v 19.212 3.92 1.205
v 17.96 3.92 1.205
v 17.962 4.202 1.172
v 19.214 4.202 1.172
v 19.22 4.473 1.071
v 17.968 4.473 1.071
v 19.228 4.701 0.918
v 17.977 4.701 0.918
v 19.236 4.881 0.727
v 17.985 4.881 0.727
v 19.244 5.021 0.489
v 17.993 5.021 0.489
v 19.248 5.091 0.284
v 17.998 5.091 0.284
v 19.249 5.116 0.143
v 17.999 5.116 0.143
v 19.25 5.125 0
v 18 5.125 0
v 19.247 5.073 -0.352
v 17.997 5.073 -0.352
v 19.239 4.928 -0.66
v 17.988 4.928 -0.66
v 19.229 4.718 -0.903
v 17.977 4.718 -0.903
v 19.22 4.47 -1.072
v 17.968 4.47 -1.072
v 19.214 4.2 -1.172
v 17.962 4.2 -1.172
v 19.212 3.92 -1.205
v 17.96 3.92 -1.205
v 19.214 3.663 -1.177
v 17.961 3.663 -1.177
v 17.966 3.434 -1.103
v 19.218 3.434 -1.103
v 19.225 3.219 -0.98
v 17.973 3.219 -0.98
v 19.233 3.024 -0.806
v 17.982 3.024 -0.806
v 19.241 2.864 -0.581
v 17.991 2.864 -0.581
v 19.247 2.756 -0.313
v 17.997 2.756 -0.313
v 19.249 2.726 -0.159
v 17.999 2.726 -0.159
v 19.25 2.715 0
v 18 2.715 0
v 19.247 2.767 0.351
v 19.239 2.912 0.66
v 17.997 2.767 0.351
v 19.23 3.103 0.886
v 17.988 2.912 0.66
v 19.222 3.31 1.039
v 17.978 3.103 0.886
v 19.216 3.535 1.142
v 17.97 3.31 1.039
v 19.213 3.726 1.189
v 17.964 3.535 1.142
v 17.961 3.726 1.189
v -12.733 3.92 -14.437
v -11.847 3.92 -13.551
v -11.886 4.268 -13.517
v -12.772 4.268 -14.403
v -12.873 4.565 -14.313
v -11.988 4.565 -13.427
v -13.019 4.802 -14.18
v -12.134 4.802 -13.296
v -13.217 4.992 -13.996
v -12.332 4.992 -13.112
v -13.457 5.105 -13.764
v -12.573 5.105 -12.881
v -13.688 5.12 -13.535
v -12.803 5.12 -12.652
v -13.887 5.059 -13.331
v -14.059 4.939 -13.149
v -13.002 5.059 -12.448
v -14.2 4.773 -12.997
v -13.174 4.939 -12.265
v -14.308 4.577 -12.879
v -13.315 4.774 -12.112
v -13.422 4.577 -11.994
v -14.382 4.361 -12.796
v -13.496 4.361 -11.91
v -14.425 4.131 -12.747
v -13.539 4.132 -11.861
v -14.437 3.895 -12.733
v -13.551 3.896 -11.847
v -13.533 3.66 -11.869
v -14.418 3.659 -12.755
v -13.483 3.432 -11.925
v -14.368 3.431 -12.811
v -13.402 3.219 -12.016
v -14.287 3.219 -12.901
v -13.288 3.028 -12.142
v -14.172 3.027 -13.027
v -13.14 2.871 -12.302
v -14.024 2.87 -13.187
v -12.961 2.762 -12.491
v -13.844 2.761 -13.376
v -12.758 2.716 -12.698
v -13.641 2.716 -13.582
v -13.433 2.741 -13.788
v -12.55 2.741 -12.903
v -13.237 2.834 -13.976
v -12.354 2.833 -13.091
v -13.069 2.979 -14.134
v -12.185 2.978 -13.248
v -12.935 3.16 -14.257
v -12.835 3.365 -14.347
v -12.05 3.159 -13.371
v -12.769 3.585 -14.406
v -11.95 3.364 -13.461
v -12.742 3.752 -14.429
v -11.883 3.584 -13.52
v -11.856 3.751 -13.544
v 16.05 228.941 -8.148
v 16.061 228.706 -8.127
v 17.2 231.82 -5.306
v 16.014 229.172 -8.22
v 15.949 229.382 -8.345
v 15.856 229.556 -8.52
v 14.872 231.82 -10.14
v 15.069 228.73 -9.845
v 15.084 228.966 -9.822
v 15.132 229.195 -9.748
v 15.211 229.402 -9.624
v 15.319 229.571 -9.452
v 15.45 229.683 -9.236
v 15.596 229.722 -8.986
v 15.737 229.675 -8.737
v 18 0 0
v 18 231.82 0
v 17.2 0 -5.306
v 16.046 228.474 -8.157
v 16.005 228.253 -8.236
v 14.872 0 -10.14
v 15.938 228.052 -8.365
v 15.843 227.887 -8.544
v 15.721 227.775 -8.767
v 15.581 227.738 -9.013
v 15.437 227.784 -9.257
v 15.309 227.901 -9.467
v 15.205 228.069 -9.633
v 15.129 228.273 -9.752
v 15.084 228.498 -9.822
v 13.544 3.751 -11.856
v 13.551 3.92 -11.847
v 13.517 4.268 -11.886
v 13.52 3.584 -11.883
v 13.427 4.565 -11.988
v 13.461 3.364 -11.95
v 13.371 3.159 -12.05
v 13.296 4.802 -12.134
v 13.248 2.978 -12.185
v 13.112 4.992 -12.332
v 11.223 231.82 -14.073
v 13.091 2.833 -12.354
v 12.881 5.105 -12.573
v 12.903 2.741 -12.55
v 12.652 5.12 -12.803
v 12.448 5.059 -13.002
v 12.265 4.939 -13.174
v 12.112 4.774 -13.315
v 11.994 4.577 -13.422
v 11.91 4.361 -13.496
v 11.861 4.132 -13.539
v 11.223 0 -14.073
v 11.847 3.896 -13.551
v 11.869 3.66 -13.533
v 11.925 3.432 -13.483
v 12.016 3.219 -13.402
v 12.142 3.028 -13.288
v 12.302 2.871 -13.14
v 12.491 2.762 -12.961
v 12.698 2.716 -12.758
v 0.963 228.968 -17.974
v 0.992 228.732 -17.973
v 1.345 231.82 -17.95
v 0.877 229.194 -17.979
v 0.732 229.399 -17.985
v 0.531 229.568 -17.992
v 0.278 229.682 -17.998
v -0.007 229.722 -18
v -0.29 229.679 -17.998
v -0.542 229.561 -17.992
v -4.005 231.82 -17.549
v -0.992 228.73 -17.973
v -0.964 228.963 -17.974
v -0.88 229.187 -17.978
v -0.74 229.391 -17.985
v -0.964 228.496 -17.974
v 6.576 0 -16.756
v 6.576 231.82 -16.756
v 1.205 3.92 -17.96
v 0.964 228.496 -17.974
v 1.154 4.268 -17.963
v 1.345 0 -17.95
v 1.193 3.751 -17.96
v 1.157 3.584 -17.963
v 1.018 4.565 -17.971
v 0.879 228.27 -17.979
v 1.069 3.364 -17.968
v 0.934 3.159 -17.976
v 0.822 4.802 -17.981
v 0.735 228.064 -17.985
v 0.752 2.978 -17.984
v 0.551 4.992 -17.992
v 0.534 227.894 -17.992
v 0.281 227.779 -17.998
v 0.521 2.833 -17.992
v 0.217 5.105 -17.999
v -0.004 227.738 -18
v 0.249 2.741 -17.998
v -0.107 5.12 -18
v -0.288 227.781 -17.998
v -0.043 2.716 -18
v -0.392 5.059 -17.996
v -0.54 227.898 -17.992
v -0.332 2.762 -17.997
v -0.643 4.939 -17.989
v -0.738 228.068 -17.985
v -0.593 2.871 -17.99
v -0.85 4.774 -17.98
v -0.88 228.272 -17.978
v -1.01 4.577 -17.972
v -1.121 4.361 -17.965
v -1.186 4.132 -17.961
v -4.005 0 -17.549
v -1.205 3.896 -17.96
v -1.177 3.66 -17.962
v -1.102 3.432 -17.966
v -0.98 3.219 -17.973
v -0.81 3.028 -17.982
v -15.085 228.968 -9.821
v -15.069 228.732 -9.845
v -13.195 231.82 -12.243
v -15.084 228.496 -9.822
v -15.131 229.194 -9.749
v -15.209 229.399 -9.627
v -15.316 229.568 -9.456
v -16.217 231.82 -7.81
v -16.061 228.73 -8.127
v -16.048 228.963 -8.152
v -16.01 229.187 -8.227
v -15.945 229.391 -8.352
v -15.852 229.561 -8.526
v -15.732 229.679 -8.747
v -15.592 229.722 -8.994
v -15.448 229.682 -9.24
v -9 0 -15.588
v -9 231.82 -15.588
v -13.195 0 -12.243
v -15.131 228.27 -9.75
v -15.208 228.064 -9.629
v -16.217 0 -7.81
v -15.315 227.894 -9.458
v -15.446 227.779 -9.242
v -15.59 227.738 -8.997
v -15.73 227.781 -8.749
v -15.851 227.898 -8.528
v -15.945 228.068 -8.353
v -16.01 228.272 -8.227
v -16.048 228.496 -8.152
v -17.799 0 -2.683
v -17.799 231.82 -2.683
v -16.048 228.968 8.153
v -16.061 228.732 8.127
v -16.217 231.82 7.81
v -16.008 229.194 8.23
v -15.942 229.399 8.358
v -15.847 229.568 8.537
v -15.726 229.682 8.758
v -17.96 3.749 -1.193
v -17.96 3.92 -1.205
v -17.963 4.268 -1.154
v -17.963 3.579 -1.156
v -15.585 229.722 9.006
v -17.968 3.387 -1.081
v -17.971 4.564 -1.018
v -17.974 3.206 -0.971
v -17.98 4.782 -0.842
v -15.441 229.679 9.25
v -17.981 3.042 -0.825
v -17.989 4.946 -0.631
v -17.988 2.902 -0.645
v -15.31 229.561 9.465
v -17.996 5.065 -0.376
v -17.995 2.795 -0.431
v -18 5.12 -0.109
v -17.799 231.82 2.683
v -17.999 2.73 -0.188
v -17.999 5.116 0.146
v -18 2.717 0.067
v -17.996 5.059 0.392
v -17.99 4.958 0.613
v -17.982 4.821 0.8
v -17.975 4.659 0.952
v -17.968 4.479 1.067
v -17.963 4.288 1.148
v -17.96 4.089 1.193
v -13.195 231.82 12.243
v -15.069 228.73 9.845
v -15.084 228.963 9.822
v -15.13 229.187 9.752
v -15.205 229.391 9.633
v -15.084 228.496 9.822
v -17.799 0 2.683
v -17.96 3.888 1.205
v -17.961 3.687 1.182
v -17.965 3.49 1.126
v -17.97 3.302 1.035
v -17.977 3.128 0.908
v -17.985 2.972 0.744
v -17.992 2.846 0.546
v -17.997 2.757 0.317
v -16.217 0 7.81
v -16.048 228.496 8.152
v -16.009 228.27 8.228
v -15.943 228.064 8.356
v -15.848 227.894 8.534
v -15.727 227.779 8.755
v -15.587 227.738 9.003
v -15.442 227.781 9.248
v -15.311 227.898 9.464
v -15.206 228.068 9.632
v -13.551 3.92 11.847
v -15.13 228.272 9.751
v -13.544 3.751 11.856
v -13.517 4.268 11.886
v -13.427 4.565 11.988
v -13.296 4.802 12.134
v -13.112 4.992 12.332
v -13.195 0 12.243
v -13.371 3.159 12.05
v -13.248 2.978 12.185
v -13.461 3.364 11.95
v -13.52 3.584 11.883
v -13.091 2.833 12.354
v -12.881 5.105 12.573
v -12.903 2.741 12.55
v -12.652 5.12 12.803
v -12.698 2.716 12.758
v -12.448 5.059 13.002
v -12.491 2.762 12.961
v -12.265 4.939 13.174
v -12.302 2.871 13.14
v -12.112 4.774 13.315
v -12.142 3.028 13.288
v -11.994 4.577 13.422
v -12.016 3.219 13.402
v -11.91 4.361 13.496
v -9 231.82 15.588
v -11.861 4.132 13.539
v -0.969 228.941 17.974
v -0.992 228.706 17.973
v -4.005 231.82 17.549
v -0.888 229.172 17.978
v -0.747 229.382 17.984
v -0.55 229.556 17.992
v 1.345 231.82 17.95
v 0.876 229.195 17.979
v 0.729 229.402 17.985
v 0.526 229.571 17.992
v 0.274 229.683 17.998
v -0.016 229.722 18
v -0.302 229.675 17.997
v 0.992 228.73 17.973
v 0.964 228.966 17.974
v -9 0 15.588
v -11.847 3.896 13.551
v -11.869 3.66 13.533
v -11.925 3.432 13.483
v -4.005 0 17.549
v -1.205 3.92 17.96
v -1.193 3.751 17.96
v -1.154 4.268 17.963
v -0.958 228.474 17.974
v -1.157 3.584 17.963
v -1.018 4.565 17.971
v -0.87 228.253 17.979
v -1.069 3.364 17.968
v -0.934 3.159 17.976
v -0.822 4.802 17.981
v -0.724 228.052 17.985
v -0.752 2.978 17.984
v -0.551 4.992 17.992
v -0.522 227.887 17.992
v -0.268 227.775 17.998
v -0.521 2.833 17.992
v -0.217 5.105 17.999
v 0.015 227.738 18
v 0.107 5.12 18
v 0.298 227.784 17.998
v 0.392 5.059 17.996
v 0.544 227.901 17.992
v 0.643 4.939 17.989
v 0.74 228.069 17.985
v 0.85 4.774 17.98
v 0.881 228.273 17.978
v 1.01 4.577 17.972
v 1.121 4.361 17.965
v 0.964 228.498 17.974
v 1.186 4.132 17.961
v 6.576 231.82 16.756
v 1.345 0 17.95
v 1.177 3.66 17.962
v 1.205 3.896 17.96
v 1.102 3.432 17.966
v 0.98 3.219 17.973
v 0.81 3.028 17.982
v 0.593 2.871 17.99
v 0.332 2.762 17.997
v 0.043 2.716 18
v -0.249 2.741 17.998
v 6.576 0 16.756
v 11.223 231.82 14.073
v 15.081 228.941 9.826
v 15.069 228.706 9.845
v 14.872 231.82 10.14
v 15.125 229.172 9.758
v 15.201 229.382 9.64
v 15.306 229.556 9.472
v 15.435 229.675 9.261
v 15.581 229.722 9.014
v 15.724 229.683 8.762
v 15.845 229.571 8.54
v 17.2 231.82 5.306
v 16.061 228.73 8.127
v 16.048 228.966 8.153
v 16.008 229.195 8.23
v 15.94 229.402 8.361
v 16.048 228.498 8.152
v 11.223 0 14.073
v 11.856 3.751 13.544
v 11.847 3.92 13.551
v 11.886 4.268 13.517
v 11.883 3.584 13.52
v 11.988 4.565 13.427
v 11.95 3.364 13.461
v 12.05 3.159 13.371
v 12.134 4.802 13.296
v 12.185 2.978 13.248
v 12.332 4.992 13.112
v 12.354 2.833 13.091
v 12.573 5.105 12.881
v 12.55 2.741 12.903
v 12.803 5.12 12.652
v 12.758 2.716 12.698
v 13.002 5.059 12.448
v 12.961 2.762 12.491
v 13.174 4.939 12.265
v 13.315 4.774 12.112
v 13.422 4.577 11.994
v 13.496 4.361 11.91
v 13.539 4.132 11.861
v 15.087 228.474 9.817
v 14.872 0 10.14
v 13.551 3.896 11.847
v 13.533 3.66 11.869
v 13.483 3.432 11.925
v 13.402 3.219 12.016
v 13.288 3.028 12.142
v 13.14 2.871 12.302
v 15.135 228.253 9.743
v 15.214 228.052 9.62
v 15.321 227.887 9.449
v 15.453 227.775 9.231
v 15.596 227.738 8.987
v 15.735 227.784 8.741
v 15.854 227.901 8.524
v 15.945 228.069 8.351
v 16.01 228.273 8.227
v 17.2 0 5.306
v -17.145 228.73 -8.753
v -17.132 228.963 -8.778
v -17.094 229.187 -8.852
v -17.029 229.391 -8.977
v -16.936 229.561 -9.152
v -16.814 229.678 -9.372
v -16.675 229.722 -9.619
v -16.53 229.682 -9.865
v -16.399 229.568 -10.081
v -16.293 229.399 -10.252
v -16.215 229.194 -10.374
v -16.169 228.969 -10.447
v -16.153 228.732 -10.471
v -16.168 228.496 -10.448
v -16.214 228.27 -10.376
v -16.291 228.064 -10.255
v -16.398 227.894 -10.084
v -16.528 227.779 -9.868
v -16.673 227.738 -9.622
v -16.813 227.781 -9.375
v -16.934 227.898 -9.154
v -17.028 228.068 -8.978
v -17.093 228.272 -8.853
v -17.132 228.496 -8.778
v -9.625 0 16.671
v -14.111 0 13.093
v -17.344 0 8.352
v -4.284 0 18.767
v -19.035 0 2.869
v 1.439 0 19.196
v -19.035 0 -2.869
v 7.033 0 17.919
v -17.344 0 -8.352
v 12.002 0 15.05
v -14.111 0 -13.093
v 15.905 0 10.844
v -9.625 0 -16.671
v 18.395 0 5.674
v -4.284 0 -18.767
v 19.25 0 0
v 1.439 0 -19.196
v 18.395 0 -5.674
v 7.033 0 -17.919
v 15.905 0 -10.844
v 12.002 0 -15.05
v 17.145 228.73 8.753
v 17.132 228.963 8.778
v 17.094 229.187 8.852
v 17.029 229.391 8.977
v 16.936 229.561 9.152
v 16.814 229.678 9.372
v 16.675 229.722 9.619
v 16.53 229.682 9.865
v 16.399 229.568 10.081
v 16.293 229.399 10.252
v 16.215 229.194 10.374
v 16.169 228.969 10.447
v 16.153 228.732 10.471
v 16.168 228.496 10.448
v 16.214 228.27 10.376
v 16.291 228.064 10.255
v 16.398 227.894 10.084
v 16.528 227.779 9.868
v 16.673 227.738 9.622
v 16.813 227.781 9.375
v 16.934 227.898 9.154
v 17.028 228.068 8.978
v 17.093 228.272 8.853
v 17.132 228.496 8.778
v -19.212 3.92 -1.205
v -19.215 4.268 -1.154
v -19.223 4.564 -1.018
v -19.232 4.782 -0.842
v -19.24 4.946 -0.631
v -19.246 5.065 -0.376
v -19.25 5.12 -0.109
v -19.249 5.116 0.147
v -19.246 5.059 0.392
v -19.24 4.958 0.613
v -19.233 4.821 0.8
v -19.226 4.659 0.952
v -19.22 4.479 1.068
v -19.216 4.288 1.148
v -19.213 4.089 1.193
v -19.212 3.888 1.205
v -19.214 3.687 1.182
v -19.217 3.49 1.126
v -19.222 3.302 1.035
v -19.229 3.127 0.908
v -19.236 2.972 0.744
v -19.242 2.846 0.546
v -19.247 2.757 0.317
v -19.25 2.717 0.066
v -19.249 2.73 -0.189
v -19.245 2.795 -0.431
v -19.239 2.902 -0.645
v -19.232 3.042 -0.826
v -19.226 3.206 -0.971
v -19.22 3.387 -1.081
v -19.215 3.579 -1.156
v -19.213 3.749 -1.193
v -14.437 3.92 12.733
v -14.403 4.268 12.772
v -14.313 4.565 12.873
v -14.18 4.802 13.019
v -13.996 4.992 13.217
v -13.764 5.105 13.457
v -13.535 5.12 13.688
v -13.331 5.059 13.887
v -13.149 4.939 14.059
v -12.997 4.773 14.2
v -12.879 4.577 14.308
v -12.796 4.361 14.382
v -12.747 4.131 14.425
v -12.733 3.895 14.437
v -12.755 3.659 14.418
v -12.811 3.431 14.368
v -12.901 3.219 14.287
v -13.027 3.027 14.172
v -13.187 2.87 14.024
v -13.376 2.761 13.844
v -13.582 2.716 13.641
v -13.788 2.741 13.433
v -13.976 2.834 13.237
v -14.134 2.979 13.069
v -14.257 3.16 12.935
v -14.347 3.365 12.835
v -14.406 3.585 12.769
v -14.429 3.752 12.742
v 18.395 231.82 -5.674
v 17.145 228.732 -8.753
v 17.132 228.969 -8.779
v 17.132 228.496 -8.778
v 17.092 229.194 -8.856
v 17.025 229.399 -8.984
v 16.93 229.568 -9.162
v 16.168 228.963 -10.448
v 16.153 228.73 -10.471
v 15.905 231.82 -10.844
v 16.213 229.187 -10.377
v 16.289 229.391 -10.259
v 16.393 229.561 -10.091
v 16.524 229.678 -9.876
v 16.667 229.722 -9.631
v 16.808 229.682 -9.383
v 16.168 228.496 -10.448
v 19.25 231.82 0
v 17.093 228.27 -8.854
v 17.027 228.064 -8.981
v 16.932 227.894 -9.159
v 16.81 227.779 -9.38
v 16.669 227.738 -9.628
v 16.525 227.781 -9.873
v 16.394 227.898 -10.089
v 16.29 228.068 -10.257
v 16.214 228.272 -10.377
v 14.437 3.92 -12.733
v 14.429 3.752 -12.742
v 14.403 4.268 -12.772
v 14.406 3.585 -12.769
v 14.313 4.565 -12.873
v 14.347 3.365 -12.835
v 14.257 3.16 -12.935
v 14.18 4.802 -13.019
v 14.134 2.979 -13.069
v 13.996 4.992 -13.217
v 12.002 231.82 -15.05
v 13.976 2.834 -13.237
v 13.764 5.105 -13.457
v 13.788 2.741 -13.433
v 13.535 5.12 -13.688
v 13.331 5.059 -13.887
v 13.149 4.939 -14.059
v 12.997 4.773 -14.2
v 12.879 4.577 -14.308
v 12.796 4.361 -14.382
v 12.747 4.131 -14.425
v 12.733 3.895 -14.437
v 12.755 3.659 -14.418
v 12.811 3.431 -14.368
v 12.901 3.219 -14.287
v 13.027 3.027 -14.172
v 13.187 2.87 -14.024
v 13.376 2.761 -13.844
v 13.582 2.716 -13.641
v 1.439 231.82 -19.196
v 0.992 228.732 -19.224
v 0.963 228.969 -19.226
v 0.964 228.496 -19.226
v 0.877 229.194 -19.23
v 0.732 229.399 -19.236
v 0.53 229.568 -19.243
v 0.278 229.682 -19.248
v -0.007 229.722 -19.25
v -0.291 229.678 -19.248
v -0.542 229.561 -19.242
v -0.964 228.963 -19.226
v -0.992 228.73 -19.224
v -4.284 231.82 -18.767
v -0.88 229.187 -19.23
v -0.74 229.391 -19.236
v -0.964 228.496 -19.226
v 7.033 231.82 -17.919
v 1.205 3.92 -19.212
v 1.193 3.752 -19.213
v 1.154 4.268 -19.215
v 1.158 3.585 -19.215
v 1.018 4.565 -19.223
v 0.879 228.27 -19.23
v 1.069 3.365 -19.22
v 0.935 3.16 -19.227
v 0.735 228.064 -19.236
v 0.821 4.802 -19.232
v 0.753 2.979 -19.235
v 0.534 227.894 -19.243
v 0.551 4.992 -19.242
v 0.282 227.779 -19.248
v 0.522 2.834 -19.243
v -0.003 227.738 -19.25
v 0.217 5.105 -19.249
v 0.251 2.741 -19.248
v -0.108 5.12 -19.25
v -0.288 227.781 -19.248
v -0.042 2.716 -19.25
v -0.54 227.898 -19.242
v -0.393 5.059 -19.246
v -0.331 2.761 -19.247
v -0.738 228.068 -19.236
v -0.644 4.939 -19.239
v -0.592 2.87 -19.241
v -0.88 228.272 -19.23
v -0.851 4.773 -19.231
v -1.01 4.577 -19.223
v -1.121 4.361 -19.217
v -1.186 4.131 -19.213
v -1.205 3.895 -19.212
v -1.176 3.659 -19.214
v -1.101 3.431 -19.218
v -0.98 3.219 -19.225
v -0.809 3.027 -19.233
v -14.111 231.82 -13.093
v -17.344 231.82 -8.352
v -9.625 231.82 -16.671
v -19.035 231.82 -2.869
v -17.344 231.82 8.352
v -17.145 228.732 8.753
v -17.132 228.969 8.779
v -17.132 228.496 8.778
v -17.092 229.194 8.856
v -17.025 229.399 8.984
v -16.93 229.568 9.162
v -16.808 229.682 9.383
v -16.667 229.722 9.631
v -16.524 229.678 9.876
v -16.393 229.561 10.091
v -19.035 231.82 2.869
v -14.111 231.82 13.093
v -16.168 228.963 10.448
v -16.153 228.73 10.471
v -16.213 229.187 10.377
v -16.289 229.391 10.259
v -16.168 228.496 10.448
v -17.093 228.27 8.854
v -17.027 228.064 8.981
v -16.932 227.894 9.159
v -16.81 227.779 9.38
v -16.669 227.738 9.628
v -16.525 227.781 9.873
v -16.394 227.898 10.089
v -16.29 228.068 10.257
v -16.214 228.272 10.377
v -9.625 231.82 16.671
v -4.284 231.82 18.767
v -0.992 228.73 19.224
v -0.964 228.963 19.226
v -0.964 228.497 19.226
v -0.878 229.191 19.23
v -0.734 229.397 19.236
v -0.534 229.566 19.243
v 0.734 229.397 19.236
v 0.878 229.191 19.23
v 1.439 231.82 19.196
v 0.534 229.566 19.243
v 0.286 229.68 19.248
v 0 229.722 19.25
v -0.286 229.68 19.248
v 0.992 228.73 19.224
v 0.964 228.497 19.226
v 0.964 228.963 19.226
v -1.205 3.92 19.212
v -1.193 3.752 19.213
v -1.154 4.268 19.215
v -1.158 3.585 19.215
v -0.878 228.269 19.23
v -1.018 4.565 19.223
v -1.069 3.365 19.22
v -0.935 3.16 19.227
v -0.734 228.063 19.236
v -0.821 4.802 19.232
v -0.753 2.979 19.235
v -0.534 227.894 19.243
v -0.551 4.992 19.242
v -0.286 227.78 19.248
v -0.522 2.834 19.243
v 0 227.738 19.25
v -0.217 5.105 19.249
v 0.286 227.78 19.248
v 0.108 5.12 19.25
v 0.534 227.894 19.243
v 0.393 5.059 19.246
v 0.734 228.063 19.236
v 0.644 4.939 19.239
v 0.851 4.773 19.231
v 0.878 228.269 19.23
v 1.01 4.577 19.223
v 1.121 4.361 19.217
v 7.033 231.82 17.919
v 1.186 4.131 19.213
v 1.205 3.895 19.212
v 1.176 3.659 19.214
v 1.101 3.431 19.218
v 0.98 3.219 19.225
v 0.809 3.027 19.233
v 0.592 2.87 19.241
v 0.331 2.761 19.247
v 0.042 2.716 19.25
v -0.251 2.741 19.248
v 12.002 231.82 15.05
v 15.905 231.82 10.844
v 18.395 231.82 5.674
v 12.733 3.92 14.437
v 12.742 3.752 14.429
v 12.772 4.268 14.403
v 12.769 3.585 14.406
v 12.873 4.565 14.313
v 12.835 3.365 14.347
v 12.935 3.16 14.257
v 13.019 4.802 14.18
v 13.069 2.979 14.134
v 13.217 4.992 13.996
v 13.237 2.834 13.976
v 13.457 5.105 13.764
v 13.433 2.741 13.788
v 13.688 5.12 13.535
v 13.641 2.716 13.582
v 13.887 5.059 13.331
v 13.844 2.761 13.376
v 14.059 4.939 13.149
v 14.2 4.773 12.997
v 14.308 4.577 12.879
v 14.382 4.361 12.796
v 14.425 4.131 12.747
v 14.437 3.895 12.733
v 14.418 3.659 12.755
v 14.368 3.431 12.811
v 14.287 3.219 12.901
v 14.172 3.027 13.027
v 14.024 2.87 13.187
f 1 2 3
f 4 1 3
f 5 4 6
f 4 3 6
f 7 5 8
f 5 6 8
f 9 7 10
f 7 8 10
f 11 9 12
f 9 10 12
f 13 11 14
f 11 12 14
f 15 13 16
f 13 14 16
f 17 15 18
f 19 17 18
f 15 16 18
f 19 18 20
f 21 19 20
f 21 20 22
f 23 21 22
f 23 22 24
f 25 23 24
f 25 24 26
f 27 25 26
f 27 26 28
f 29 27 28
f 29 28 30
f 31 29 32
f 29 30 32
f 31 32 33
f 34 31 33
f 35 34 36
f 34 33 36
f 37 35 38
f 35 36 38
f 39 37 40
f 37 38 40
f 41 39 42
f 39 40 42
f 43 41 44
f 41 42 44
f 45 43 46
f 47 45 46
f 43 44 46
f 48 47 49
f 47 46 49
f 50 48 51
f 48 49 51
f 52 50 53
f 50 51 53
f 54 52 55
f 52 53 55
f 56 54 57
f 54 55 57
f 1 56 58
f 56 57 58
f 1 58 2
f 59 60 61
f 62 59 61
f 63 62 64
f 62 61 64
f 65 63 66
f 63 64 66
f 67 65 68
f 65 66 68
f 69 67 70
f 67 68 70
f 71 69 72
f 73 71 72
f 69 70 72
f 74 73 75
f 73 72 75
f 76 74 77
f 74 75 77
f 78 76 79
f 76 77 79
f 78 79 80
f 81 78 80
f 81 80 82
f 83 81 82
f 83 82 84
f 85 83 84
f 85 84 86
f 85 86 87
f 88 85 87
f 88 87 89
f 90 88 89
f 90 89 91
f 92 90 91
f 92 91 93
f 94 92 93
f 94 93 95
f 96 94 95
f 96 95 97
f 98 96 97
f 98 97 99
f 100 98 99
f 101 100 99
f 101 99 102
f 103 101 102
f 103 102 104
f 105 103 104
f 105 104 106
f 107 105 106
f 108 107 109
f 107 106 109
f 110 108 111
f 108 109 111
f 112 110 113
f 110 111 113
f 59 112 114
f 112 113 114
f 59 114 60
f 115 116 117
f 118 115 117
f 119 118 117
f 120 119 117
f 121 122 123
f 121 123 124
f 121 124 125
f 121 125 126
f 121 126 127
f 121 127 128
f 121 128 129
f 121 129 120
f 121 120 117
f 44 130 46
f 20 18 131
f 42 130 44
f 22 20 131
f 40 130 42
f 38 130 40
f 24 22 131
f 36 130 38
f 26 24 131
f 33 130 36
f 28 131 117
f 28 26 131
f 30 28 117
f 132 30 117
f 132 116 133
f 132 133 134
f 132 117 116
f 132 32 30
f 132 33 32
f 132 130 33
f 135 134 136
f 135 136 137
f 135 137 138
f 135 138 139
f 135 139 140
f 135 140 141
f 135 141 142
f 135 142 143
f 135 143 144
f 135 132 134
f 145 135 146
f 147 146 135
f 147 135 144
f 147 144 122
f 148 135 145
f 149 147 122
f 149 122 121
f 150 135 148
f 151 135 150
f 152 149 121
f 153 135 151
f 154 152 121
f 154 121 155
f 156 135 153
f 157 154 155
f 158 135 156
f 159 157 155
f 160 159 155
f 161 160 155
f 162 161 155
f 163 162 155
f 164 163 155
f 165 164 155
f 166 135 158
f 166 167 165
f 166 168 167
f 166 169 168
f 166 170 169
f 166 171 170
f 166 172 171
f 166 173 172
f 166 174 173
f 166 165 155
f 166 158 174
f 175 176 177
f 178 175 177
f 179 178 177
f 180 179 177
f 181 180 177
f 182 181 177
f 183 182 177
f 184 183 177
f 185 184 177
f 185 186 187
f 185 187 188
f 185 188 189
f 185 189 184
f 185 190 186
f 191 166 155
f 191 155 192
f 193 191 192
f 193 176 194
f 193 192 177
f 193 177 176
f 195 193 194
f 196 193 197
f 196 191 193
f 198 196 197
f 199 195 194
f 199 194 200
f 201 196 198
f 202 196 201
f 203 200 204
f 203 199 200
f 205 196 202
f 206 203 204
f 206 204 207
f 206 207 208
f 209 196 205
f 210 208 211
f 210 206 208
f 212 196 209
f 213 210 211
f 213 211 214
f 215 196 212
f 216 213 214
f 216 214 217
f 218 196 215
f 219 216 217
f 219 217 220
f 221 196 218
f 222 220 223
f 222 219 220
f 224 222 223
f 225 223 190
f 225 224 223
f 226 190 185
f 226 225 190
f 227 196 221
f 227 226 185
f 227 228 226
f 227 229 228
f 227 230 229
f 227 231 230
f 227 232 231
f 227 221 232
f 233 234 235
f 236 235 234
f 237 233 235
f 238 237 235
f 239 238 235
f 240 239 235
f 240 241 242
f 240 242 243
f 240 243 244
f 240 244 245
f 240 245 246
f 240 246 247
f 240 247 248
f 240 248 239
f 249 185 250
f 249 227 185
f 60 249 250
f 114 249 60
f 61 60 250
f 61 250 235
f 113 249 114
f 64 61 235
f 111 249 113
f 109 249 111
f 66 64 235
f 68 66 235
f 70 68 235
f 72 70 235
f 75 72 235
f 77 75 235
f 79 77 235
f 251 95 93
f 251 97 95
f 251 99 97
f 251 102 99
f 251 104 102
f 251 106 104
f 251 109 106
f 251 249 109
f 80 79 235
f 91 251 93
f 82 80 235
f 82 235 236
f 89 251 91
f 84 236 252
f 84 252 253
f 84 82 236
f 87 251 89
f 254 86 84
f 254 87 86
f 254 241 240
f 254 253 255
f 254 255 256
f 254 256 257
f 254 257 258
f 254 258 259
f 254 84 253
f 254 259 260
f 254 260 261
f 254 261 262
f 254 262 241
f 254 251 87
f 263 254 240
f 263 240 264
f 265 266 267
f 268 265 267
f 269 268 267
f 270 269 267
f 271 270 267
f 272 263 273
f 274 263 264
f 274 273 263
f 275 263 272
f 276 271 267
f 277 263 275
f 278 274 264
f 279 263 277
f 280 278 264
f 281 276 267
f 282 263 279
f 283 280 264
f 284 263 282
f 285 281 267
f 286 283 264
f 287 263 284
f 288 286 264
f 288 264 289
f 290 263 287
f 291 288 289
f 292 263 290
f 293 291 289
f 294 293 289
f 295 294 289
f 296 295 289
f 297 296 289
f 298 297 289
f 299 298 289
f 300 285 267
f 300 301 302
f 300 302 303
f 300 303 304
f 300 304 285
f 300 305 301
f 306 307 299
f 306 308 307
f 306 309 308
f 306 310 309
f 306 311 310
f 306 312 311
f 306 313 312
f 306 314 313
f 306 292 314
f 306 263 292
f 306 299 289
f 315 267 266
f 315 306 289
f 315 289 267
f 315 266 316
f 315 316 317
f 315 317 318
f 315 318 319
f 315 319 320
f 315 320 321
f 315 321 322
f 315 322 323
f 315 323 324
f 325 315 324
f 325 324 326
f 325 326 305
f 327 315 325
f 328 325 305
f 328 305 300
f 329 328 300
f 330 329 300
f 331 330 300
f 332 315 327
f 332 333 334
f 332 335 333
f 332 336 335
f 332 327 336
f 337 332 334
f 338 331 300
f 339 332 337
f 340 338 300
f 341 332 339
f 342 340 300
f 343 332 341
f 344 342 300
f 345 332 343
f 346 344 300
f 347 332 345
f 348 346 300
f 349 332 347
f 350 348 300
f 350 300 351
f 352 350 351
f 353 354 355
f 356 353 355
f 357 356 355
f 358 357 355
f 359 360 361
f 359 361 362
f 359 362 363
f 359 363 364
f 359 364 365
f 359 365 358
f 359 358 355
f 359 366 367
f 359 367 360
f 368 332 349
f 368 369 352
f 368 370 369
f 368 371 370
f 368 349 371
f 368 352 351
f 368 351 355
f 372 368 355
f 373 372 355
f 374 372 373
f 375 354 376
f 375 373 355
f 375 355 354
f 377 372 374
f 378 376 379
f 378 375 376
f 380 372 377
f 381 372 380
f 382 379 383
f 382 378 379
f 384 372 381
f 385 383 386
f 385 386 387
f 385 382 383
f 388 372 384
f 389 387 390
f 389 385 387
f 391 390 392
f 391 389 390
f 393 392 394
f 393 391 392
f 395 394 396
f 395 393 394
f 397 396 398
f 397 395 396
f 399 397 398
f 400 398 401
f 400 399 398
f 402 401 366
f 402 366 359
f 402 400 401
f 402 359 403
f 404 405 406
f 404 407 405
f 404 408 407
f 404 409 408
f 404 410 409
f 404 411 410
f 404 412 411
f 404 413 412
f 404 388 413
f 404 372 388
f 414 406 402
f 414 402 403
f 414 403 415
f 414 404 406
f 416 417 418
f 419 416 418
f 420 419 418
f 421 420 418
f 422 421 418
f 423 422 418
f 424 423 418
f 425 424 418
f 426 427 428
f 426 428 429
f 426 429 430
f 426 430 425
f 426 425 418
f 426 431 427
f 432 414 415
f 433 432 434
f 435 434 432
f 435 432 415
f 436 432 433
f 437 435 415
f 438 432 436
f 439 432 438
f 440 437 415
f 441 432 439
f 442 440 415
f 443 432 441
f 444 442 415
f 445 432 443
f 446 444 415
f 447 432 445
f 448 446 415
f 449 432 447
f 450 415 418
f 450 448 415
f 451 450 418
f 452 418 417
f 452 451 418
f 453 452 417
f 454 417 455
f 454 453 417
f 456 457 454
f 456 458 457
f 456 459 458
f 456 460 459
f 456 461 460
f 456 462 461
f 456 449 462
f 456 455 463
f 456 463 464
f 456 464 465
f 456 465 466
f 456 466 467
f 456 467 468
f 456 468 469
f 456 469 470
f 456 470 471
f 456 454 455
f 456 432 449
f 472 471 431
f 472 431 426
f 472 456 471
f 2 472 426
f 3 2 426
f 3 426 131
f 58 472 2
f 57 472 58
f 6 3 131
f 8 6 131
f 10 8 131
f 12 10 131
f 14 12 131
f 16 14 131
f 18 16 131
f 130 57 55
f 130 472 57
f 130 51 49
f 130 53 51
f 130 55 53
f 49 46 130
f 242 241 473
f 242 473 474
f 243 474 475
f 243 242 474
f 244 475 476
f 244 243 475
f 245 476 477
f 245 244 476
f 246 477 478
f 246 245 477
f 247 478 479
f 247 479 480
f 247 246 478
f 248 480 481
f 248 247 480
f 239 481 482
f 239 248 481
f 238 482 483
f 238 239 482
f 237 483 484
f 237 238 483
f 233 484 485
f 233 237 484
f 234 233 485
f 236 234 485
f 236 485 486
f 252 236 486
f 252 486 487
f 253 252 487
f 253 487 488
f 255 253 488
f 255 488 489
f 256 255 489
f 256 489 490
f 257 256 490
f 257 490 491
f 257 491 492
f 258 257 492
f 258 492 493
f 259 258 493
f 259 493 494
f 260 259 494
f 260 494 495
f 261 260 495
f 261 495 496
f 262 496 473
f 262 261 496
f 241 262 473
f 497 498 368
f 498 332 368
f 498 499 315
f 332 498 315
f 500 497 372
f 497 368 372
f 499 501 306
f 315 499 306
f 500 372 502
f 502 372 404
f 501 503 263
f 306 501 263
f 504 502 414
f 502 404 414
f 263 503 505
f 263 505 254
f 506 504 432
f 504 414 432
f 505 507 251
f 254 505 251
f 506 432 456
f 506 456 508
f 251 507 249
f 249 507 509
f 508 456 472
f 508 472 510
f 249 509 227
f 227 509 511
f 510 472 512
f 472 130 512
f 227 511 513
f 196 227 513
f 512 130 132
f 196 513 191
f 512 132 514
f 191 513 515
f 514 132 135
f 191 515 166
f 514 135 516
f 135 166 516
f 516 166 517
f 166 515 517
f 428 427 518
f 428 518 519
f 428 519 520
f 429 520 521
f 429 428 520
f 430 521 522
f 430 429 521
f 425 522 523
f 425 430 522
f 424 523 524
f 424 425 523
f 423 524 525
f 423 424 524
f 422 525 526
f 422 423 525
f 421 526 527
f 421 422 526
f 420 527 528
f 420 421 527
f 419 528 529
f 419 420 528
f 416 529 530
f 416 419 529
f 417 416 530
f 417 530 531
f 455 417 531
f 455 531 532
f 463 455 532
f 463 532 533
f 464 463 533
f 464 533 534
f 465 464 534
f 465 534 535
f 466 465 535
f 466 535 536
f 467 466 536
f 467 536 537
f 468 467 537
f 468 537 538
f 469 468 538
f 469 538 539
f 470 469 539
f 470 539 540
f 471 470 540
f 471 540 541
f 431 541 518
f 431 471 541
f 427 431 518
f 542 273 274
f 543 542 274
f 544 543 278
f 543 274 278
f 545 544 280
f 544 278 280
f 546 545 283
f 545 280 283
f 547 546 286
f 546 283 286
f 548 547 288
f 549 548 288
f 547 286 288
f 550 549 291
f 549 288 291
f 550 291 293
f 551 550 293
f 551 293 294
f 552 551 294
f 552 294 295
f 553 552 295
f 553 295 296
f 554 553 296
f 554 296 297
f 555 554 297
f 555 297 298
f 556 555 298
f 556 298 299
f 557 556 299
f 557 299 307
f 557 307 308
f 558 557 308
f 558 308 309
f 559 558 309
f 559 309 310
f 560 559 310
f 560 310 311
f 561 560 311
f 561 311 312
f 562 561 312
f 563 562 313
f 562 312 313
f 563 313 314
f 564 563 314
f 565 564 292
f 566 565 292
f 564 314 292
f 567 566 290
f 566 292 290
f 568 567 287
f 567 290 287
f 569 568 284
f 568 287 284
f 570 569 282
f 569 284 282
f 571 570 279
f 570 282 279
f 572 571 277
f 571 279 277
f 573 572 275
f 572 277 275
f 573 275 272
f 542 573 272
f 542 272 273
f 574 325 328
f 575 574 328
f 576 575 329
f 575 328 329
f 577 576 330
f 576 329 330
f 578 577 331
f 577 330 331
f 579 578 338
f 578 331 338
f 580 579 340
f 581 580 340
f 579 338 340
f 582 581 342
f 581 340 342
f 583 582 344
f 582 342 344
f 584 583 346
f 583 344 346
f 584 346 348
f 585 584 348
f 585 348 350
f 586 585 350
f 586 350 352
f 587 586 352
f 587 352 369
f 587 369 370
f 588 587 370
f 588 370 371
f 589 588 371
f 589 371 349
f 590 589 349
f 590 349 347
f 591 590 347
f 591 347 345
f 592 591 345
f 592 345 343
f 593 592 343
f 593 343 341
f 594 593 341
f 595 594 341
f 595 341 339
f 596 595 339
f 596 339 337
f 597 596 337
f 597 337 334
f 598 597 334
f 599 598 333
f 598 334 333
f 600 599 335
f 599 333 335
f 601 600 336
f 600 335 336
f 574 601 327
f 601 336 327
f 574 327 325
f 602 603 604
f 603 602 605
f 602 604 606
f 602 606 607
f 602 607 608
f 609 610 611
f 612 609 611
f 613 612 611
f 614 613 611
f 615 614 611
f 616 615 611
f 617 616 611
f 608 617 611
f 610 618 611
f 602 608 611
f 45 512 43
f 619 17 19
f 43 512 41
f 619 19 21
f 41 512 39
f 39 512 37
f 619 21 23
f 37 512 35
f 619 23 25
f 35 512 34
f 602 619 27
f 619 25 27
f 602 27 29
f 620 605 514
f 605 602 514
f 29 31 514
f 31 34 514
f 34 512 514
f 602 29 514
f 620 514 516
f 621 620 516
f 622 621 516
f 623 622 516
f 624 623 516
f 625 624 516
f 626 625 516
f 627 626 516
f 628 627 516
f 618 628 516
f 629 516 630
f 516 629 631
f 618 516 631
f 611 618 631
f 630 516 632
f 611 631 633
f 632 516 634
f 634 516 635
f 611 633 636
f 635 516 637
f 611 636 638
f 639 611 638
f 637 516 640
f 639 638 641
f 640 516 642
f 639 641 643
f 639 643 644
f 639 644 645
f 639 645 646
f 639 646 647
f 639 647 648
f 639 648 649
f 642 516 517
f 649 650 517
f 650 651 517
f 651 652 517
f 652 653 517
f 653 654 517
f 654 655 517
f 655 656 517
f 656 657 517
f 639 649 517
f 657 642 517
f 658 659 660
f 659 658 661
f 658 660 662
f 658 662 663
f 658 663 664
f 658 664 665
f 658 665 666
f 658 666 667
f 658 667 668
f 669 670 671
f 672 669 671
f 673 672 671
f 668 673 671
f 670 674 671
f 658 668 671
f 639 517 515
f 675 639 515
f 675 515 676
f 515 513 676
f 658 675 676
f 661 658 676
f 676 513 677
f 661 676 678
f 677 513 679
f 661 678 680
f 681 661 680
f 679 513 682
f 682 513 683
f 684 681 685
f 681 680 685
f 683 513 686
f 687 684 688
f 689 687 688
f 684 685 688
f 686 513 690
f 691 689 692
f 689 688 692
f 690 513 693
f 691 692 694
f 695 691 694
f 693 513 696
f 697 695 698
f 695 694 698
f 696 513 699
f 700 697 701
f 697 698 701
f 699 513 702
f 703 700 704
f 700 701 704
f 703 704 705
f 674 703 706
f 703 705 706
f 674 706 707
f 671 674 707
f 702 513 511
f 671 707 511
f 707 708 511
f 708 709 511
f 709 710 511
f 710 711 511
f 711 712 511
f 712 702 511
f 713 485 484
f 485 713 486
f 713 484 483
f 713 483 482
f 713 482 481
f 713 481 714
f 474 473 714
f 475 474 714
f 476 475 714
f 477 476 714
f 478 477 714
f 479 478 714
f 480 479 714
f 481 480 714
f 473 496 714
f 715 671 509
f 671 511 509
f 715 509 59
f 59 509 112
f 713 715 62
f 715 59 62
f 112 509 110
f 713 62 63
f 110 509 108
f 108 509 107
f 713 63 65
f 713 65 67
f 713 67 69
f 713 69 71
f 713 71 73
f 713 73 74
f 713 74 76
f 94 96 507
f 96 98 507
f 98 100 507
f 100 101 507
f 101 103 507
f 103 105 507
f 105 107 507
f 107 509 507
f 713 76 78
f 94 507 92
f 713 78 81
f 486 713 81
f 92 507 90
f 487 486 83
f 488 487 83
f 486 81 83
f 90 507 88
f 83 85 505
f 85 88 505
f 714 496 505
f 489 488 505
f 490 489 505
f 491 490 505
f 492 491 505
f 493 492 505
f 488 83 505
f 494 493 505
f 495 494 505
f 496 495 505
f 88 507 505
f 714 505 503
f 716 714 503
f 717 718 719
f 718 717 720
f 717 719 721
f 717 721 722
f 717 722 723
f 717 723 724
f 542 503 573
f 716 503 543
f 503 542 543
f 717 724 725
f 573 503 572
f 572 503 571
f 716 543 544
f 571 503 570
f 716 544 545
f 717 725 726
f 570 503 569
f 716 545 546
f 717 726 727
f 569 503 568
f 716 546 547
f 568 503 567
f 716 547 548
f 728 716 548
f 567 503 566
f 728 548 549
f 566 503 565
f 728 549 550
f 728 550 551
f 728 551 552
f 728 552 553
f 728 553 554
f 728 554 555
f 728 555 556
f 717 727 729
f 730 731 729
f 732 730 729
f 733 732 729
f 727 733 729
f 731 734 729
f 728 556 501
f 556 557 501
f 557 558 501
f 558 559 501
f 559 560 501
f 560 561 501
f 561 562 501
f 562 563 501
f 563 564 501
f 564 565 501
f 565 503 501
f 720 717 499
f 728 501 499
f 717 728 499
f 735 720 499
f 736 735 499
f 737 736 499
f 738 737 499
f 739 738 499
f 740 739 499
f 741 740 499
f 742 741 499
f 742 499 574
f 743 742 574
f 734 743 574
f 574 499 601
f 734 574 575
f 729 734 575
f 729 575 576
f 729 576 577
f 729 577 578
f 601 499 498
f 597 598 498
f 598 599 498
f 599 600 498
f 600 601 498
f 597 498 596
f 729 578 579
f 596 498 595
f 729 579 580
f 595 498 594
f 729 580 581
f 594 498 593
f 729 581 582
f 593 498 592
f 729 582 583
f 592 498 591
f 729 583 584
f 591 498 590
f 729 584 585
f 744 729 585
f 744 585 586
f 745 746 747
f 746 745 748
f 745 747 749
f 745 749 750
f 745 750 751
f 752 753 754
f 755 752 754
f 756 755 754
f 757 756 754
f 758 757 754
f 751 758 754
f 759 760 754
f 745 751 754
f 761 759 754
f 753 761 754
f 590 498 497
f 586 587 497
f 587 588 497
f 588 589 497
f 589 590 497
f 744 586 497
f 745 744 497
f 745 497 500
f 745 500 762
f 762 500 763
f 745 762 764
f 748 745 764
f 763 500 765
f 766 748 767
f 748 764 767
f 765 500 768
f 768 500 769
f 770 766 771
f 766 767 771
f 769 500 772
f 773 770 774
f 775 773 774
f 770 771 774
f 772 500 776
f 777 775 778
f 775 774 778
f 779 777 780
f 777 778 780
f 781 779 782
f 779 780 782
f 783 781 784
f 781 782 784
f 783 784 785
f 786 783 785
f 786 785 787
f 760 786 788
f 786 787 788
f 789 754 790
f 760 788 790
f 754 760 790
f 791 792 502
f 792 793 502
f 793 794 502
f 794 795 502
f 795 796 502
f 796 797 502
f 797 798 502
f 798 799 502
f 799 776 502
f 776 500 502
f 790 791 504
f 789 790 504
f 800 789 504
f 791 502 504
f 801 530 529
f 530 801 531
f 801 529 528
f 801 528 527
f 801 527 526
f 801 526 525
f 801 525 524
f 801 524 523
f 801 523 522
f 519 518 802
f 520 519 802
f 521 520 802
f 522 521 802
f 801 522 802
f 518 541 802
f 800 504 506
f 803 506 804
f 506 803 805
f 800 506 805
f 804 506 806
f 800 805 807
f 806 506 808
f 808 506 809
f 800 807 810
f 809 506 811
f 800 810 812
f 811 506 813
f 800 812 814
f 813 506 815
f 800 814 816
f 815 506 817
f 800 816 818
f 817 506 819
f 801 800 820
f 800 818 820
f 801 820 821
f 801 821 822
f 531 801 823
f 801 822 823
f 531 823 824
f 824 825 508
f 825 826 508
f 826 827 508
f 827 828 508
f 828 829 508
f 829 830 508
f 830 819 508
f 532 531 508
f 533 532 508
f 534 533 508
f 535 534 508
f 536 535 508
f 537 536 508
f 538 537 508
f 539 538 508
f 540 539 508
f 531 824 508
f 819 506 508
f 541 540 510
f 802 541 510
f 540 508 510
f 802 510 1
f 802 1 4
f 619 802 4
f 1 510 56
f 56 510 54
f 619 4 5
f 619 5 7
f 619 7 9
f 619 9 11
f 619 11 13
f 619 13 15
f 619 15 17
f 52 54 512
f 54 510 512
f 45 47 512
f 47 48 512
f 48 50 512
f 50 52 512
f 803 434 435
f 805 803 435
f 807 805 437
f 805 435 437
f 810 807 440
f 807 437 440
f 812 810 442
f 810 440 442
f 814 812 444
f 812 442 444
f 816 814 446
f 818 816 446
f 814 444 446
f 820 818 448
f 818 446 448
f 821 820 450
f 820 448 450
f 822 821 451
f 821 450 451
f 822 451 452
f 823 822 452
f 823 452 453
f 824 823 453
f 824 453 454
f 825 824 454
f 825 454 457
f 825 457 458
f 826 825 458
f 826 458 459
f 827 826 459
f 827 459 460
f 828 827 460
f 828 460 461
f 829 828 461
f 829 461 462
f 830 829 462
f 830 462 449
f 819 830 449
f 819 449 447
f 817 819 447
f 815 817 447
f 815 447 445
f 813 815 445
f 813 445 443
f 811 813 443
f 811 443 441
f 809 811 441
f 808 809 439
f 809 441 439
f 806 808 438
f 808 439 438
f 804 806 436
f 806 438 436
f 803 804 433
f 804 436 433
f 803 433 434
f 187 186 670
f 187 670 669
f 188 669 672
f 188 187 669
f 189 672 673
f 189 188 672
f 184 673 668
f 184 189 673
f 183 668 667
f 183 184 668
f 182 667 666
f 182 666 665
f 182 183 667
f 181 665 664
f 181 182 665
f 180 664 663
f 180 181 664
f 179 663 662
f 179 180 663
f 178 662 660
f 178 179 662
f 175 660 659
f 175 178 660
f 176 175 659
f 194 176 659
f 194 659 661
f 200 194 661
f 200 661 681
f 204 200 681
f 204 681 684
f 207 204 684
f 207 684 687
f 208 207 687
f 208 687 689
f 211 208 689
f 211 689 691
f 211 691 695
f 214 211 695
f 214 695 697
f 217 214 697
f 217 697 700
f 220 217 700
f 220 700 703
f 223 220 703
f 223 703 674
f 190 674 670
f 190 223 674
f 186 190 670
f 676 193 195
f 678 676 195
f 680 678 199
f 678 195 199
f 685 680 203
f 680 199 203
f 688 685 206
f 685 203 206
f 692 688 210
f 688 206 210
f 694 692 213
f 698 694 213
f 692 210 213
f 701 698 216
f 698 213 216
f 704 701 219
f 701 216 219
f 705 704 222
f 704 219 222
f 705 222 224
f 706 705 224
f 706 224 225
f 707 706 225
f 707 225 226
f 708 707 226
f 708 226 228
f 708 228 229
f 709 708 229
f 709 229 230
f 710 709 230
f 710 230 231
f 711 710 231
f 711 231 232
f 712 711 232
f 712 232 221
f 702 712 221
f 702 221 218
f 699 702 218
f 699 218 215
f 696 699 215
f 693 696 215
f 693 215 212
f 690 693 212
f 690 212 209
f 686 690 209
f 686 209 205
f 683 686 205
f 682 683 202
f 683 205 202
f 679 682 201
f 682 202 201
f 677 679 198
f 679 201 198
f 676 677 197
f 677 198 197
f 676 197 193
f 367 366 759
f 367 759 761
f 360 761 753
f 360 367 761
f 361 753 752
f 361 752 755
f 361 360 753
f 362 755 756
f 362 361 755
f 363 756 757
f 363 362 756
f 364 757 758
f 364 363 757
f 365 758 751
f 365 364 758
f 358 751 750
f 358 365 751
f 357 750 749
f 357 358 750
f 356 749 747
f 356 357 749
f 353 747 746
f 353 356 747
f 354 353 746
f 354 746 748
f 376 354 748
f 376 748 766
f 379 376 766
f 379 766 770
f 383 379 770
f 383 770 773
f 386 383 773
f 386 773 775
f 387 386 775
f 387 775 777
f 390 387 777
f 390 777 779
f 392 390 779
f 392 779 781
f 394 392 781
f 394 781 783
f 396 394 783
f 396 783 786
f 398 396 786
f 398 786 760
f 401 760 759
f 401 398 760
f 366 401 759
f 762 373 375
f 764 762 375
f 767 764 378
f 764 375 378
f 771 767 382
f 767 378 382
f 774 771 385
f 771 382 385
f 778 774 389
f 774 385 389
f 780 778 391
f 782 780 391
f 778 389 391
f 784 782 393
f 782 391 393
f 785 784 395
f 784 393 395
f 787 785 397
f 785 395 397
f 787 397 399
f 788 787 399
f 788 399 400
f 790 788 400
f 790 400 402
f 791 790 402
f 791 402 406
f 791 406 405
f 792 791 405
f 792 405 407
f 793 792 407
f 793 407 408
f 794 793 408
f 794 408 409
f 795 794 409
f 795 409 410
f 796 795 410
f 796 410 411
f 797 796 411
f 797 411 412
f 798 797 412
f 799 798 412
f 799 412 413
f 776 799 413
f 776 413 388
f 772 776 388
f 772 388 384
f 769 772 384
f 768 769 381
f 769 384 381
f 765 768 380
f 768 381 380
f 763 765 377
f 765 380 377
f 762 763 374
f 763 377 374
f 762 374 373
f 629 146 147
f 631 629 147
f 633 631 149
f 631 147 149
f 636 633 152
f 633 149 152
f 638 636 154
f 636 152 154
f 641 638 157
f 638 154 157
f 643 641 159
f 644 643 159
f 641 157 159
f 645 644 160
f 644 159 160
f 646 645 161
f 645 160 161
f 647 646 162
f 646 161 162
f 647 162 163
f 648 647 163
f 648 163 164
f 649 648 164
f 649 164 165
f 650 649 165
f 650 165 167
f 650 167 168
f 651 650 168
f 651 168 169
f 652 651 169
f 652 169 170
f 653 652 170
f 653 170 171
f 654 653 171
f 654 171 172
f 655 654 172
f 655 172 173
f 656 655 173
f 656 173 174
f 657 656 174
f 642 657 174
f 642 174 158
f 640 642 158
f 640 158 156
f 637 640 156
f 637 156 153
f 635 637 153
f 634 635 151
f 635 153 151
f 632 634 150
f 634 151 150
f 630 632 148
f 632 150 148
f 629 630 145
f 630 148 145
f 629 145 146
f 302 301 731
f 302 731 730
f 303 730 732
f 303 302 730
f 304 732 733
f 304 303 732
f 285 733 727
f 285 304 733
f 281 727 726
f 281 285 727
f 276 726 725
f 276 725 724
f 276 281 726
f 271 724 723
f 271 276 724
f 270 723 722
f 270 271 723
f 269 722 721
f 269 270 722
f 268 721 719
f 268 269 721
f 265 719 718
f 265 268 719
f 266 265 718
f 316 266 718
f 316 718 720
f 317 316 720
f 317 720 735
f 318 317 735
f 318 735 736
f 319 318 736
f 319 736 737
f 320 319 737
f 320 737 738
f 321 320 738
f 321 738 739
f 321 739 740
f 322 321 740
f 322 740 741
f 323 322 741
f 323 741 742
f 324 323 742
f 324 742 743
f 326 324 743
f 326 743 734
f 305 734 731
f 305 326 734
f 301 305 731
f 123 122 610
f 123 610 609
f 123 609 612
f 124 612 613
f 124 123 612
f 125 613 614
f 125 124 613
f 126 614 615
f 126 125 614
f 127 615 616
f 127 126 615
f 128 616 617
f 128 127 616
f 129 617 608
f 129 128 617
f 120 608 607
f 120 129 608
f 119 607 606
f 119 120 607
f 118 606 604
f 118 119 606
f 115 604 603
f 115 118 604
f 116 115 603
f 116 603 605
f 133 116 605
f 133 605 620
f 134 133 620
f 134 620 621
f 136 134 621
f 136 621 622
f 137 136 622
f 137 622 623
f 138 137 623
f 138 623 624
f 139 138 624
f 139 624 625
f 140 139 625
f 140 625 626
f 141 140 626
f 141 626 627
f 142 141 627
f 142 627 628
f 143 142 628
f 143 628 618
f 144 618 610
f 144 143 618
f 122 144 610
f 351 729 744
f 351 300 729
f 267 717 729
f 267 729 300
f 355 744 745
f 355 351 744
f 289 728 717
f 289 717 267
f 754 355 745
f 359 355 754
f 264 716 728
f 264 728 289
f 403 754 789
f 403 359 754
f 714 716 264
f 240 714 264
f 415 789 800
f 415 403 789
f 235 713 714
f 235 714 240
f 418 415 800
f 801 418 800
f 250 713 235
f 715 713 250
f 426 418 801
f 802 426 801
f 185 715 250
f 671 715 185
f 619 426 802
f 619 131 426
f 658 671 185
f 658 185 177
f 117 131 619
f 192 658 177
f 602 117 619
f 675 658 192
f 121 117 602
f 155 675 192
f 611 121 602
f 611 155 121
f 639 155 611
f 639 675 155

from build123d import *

# Parameters (mm, degrees)
SKETCH2_R           = 19.25
SKETCH2_R_2         = 18
BOSS_EXTRUDE1_DEPTH = 231.82
SKETCH3_R           = 1.205
CUT_EXTRUDE2_DEPTH  = 231.82
CIRPATTERN3_COUNT   = 8
SKETCH4_R           = 0.991990711
CUT_EXTRUDE3_DEPTH  = 231.82
CIRPATTERN4_COUNT   = 6


with BuildPart() as part:
    # Sketch2 → Boss-Extrude1 (new body)
    with BuildSketch(Plane(origin=(0, 0, 0), x_dir=(1, 0, 0), z_dir=(0, 1, 0))):
        Circle(SKETCH2_R)
        Circle(SKETCH2_R_2, mode=Mode.SUBTRACT)
    extrude(amount=BOSS_EXTRUDE1_DEPTH)

    # Sketch3 → Cut-Extrude2 (cut)
    with BuildSketch(Plane.XY):
        with Locations((0, 3.92)):
            Circle(SKETCH3_R)
    cut_extrude2 = extrude(amount=-CUT_EXTRUDE2_DEPTH, mode=Mode.SUBTRACT)

    # CirPattern3: Cut-Extrude2 ×8 about axis
    cirpattern3_axis = Axis((0, 231.82, 0), (0, -1, 0))
    for i in range(1, CIRPATTERN3_COUNT):
        add(cut_extrude2.rotate(cirpattern3_axis, i * 360 / CIRPATTERN3_COUNT), mode=Mode.SUBTRACT)

    # Sketch4 → Cut-Extrude3 (cut)
    with BuildSketch(Plane.XY):
        with Locations((0, 228.73)):
            Circle(SKETCH4_R)
    cut_extrude3 = extrude(amount=CUT_EXTRUDE3_DEPTH, mode=Mode.SUBTRACT)

    # CirPattern4: Cut-Extrude3 ×6 about axis
    cirpattern4_axis = Axis((0, 231.82, 0), (0, -1, 0))
    for i in range(1, CIRPATTERN4_COUNT):
        add(cut_extrude3.rotate(cirpattern4_axis, i * 360 / CIRPATTERN4_COUNT), mode=Mode.SUBTRACT)


solid = part.part
